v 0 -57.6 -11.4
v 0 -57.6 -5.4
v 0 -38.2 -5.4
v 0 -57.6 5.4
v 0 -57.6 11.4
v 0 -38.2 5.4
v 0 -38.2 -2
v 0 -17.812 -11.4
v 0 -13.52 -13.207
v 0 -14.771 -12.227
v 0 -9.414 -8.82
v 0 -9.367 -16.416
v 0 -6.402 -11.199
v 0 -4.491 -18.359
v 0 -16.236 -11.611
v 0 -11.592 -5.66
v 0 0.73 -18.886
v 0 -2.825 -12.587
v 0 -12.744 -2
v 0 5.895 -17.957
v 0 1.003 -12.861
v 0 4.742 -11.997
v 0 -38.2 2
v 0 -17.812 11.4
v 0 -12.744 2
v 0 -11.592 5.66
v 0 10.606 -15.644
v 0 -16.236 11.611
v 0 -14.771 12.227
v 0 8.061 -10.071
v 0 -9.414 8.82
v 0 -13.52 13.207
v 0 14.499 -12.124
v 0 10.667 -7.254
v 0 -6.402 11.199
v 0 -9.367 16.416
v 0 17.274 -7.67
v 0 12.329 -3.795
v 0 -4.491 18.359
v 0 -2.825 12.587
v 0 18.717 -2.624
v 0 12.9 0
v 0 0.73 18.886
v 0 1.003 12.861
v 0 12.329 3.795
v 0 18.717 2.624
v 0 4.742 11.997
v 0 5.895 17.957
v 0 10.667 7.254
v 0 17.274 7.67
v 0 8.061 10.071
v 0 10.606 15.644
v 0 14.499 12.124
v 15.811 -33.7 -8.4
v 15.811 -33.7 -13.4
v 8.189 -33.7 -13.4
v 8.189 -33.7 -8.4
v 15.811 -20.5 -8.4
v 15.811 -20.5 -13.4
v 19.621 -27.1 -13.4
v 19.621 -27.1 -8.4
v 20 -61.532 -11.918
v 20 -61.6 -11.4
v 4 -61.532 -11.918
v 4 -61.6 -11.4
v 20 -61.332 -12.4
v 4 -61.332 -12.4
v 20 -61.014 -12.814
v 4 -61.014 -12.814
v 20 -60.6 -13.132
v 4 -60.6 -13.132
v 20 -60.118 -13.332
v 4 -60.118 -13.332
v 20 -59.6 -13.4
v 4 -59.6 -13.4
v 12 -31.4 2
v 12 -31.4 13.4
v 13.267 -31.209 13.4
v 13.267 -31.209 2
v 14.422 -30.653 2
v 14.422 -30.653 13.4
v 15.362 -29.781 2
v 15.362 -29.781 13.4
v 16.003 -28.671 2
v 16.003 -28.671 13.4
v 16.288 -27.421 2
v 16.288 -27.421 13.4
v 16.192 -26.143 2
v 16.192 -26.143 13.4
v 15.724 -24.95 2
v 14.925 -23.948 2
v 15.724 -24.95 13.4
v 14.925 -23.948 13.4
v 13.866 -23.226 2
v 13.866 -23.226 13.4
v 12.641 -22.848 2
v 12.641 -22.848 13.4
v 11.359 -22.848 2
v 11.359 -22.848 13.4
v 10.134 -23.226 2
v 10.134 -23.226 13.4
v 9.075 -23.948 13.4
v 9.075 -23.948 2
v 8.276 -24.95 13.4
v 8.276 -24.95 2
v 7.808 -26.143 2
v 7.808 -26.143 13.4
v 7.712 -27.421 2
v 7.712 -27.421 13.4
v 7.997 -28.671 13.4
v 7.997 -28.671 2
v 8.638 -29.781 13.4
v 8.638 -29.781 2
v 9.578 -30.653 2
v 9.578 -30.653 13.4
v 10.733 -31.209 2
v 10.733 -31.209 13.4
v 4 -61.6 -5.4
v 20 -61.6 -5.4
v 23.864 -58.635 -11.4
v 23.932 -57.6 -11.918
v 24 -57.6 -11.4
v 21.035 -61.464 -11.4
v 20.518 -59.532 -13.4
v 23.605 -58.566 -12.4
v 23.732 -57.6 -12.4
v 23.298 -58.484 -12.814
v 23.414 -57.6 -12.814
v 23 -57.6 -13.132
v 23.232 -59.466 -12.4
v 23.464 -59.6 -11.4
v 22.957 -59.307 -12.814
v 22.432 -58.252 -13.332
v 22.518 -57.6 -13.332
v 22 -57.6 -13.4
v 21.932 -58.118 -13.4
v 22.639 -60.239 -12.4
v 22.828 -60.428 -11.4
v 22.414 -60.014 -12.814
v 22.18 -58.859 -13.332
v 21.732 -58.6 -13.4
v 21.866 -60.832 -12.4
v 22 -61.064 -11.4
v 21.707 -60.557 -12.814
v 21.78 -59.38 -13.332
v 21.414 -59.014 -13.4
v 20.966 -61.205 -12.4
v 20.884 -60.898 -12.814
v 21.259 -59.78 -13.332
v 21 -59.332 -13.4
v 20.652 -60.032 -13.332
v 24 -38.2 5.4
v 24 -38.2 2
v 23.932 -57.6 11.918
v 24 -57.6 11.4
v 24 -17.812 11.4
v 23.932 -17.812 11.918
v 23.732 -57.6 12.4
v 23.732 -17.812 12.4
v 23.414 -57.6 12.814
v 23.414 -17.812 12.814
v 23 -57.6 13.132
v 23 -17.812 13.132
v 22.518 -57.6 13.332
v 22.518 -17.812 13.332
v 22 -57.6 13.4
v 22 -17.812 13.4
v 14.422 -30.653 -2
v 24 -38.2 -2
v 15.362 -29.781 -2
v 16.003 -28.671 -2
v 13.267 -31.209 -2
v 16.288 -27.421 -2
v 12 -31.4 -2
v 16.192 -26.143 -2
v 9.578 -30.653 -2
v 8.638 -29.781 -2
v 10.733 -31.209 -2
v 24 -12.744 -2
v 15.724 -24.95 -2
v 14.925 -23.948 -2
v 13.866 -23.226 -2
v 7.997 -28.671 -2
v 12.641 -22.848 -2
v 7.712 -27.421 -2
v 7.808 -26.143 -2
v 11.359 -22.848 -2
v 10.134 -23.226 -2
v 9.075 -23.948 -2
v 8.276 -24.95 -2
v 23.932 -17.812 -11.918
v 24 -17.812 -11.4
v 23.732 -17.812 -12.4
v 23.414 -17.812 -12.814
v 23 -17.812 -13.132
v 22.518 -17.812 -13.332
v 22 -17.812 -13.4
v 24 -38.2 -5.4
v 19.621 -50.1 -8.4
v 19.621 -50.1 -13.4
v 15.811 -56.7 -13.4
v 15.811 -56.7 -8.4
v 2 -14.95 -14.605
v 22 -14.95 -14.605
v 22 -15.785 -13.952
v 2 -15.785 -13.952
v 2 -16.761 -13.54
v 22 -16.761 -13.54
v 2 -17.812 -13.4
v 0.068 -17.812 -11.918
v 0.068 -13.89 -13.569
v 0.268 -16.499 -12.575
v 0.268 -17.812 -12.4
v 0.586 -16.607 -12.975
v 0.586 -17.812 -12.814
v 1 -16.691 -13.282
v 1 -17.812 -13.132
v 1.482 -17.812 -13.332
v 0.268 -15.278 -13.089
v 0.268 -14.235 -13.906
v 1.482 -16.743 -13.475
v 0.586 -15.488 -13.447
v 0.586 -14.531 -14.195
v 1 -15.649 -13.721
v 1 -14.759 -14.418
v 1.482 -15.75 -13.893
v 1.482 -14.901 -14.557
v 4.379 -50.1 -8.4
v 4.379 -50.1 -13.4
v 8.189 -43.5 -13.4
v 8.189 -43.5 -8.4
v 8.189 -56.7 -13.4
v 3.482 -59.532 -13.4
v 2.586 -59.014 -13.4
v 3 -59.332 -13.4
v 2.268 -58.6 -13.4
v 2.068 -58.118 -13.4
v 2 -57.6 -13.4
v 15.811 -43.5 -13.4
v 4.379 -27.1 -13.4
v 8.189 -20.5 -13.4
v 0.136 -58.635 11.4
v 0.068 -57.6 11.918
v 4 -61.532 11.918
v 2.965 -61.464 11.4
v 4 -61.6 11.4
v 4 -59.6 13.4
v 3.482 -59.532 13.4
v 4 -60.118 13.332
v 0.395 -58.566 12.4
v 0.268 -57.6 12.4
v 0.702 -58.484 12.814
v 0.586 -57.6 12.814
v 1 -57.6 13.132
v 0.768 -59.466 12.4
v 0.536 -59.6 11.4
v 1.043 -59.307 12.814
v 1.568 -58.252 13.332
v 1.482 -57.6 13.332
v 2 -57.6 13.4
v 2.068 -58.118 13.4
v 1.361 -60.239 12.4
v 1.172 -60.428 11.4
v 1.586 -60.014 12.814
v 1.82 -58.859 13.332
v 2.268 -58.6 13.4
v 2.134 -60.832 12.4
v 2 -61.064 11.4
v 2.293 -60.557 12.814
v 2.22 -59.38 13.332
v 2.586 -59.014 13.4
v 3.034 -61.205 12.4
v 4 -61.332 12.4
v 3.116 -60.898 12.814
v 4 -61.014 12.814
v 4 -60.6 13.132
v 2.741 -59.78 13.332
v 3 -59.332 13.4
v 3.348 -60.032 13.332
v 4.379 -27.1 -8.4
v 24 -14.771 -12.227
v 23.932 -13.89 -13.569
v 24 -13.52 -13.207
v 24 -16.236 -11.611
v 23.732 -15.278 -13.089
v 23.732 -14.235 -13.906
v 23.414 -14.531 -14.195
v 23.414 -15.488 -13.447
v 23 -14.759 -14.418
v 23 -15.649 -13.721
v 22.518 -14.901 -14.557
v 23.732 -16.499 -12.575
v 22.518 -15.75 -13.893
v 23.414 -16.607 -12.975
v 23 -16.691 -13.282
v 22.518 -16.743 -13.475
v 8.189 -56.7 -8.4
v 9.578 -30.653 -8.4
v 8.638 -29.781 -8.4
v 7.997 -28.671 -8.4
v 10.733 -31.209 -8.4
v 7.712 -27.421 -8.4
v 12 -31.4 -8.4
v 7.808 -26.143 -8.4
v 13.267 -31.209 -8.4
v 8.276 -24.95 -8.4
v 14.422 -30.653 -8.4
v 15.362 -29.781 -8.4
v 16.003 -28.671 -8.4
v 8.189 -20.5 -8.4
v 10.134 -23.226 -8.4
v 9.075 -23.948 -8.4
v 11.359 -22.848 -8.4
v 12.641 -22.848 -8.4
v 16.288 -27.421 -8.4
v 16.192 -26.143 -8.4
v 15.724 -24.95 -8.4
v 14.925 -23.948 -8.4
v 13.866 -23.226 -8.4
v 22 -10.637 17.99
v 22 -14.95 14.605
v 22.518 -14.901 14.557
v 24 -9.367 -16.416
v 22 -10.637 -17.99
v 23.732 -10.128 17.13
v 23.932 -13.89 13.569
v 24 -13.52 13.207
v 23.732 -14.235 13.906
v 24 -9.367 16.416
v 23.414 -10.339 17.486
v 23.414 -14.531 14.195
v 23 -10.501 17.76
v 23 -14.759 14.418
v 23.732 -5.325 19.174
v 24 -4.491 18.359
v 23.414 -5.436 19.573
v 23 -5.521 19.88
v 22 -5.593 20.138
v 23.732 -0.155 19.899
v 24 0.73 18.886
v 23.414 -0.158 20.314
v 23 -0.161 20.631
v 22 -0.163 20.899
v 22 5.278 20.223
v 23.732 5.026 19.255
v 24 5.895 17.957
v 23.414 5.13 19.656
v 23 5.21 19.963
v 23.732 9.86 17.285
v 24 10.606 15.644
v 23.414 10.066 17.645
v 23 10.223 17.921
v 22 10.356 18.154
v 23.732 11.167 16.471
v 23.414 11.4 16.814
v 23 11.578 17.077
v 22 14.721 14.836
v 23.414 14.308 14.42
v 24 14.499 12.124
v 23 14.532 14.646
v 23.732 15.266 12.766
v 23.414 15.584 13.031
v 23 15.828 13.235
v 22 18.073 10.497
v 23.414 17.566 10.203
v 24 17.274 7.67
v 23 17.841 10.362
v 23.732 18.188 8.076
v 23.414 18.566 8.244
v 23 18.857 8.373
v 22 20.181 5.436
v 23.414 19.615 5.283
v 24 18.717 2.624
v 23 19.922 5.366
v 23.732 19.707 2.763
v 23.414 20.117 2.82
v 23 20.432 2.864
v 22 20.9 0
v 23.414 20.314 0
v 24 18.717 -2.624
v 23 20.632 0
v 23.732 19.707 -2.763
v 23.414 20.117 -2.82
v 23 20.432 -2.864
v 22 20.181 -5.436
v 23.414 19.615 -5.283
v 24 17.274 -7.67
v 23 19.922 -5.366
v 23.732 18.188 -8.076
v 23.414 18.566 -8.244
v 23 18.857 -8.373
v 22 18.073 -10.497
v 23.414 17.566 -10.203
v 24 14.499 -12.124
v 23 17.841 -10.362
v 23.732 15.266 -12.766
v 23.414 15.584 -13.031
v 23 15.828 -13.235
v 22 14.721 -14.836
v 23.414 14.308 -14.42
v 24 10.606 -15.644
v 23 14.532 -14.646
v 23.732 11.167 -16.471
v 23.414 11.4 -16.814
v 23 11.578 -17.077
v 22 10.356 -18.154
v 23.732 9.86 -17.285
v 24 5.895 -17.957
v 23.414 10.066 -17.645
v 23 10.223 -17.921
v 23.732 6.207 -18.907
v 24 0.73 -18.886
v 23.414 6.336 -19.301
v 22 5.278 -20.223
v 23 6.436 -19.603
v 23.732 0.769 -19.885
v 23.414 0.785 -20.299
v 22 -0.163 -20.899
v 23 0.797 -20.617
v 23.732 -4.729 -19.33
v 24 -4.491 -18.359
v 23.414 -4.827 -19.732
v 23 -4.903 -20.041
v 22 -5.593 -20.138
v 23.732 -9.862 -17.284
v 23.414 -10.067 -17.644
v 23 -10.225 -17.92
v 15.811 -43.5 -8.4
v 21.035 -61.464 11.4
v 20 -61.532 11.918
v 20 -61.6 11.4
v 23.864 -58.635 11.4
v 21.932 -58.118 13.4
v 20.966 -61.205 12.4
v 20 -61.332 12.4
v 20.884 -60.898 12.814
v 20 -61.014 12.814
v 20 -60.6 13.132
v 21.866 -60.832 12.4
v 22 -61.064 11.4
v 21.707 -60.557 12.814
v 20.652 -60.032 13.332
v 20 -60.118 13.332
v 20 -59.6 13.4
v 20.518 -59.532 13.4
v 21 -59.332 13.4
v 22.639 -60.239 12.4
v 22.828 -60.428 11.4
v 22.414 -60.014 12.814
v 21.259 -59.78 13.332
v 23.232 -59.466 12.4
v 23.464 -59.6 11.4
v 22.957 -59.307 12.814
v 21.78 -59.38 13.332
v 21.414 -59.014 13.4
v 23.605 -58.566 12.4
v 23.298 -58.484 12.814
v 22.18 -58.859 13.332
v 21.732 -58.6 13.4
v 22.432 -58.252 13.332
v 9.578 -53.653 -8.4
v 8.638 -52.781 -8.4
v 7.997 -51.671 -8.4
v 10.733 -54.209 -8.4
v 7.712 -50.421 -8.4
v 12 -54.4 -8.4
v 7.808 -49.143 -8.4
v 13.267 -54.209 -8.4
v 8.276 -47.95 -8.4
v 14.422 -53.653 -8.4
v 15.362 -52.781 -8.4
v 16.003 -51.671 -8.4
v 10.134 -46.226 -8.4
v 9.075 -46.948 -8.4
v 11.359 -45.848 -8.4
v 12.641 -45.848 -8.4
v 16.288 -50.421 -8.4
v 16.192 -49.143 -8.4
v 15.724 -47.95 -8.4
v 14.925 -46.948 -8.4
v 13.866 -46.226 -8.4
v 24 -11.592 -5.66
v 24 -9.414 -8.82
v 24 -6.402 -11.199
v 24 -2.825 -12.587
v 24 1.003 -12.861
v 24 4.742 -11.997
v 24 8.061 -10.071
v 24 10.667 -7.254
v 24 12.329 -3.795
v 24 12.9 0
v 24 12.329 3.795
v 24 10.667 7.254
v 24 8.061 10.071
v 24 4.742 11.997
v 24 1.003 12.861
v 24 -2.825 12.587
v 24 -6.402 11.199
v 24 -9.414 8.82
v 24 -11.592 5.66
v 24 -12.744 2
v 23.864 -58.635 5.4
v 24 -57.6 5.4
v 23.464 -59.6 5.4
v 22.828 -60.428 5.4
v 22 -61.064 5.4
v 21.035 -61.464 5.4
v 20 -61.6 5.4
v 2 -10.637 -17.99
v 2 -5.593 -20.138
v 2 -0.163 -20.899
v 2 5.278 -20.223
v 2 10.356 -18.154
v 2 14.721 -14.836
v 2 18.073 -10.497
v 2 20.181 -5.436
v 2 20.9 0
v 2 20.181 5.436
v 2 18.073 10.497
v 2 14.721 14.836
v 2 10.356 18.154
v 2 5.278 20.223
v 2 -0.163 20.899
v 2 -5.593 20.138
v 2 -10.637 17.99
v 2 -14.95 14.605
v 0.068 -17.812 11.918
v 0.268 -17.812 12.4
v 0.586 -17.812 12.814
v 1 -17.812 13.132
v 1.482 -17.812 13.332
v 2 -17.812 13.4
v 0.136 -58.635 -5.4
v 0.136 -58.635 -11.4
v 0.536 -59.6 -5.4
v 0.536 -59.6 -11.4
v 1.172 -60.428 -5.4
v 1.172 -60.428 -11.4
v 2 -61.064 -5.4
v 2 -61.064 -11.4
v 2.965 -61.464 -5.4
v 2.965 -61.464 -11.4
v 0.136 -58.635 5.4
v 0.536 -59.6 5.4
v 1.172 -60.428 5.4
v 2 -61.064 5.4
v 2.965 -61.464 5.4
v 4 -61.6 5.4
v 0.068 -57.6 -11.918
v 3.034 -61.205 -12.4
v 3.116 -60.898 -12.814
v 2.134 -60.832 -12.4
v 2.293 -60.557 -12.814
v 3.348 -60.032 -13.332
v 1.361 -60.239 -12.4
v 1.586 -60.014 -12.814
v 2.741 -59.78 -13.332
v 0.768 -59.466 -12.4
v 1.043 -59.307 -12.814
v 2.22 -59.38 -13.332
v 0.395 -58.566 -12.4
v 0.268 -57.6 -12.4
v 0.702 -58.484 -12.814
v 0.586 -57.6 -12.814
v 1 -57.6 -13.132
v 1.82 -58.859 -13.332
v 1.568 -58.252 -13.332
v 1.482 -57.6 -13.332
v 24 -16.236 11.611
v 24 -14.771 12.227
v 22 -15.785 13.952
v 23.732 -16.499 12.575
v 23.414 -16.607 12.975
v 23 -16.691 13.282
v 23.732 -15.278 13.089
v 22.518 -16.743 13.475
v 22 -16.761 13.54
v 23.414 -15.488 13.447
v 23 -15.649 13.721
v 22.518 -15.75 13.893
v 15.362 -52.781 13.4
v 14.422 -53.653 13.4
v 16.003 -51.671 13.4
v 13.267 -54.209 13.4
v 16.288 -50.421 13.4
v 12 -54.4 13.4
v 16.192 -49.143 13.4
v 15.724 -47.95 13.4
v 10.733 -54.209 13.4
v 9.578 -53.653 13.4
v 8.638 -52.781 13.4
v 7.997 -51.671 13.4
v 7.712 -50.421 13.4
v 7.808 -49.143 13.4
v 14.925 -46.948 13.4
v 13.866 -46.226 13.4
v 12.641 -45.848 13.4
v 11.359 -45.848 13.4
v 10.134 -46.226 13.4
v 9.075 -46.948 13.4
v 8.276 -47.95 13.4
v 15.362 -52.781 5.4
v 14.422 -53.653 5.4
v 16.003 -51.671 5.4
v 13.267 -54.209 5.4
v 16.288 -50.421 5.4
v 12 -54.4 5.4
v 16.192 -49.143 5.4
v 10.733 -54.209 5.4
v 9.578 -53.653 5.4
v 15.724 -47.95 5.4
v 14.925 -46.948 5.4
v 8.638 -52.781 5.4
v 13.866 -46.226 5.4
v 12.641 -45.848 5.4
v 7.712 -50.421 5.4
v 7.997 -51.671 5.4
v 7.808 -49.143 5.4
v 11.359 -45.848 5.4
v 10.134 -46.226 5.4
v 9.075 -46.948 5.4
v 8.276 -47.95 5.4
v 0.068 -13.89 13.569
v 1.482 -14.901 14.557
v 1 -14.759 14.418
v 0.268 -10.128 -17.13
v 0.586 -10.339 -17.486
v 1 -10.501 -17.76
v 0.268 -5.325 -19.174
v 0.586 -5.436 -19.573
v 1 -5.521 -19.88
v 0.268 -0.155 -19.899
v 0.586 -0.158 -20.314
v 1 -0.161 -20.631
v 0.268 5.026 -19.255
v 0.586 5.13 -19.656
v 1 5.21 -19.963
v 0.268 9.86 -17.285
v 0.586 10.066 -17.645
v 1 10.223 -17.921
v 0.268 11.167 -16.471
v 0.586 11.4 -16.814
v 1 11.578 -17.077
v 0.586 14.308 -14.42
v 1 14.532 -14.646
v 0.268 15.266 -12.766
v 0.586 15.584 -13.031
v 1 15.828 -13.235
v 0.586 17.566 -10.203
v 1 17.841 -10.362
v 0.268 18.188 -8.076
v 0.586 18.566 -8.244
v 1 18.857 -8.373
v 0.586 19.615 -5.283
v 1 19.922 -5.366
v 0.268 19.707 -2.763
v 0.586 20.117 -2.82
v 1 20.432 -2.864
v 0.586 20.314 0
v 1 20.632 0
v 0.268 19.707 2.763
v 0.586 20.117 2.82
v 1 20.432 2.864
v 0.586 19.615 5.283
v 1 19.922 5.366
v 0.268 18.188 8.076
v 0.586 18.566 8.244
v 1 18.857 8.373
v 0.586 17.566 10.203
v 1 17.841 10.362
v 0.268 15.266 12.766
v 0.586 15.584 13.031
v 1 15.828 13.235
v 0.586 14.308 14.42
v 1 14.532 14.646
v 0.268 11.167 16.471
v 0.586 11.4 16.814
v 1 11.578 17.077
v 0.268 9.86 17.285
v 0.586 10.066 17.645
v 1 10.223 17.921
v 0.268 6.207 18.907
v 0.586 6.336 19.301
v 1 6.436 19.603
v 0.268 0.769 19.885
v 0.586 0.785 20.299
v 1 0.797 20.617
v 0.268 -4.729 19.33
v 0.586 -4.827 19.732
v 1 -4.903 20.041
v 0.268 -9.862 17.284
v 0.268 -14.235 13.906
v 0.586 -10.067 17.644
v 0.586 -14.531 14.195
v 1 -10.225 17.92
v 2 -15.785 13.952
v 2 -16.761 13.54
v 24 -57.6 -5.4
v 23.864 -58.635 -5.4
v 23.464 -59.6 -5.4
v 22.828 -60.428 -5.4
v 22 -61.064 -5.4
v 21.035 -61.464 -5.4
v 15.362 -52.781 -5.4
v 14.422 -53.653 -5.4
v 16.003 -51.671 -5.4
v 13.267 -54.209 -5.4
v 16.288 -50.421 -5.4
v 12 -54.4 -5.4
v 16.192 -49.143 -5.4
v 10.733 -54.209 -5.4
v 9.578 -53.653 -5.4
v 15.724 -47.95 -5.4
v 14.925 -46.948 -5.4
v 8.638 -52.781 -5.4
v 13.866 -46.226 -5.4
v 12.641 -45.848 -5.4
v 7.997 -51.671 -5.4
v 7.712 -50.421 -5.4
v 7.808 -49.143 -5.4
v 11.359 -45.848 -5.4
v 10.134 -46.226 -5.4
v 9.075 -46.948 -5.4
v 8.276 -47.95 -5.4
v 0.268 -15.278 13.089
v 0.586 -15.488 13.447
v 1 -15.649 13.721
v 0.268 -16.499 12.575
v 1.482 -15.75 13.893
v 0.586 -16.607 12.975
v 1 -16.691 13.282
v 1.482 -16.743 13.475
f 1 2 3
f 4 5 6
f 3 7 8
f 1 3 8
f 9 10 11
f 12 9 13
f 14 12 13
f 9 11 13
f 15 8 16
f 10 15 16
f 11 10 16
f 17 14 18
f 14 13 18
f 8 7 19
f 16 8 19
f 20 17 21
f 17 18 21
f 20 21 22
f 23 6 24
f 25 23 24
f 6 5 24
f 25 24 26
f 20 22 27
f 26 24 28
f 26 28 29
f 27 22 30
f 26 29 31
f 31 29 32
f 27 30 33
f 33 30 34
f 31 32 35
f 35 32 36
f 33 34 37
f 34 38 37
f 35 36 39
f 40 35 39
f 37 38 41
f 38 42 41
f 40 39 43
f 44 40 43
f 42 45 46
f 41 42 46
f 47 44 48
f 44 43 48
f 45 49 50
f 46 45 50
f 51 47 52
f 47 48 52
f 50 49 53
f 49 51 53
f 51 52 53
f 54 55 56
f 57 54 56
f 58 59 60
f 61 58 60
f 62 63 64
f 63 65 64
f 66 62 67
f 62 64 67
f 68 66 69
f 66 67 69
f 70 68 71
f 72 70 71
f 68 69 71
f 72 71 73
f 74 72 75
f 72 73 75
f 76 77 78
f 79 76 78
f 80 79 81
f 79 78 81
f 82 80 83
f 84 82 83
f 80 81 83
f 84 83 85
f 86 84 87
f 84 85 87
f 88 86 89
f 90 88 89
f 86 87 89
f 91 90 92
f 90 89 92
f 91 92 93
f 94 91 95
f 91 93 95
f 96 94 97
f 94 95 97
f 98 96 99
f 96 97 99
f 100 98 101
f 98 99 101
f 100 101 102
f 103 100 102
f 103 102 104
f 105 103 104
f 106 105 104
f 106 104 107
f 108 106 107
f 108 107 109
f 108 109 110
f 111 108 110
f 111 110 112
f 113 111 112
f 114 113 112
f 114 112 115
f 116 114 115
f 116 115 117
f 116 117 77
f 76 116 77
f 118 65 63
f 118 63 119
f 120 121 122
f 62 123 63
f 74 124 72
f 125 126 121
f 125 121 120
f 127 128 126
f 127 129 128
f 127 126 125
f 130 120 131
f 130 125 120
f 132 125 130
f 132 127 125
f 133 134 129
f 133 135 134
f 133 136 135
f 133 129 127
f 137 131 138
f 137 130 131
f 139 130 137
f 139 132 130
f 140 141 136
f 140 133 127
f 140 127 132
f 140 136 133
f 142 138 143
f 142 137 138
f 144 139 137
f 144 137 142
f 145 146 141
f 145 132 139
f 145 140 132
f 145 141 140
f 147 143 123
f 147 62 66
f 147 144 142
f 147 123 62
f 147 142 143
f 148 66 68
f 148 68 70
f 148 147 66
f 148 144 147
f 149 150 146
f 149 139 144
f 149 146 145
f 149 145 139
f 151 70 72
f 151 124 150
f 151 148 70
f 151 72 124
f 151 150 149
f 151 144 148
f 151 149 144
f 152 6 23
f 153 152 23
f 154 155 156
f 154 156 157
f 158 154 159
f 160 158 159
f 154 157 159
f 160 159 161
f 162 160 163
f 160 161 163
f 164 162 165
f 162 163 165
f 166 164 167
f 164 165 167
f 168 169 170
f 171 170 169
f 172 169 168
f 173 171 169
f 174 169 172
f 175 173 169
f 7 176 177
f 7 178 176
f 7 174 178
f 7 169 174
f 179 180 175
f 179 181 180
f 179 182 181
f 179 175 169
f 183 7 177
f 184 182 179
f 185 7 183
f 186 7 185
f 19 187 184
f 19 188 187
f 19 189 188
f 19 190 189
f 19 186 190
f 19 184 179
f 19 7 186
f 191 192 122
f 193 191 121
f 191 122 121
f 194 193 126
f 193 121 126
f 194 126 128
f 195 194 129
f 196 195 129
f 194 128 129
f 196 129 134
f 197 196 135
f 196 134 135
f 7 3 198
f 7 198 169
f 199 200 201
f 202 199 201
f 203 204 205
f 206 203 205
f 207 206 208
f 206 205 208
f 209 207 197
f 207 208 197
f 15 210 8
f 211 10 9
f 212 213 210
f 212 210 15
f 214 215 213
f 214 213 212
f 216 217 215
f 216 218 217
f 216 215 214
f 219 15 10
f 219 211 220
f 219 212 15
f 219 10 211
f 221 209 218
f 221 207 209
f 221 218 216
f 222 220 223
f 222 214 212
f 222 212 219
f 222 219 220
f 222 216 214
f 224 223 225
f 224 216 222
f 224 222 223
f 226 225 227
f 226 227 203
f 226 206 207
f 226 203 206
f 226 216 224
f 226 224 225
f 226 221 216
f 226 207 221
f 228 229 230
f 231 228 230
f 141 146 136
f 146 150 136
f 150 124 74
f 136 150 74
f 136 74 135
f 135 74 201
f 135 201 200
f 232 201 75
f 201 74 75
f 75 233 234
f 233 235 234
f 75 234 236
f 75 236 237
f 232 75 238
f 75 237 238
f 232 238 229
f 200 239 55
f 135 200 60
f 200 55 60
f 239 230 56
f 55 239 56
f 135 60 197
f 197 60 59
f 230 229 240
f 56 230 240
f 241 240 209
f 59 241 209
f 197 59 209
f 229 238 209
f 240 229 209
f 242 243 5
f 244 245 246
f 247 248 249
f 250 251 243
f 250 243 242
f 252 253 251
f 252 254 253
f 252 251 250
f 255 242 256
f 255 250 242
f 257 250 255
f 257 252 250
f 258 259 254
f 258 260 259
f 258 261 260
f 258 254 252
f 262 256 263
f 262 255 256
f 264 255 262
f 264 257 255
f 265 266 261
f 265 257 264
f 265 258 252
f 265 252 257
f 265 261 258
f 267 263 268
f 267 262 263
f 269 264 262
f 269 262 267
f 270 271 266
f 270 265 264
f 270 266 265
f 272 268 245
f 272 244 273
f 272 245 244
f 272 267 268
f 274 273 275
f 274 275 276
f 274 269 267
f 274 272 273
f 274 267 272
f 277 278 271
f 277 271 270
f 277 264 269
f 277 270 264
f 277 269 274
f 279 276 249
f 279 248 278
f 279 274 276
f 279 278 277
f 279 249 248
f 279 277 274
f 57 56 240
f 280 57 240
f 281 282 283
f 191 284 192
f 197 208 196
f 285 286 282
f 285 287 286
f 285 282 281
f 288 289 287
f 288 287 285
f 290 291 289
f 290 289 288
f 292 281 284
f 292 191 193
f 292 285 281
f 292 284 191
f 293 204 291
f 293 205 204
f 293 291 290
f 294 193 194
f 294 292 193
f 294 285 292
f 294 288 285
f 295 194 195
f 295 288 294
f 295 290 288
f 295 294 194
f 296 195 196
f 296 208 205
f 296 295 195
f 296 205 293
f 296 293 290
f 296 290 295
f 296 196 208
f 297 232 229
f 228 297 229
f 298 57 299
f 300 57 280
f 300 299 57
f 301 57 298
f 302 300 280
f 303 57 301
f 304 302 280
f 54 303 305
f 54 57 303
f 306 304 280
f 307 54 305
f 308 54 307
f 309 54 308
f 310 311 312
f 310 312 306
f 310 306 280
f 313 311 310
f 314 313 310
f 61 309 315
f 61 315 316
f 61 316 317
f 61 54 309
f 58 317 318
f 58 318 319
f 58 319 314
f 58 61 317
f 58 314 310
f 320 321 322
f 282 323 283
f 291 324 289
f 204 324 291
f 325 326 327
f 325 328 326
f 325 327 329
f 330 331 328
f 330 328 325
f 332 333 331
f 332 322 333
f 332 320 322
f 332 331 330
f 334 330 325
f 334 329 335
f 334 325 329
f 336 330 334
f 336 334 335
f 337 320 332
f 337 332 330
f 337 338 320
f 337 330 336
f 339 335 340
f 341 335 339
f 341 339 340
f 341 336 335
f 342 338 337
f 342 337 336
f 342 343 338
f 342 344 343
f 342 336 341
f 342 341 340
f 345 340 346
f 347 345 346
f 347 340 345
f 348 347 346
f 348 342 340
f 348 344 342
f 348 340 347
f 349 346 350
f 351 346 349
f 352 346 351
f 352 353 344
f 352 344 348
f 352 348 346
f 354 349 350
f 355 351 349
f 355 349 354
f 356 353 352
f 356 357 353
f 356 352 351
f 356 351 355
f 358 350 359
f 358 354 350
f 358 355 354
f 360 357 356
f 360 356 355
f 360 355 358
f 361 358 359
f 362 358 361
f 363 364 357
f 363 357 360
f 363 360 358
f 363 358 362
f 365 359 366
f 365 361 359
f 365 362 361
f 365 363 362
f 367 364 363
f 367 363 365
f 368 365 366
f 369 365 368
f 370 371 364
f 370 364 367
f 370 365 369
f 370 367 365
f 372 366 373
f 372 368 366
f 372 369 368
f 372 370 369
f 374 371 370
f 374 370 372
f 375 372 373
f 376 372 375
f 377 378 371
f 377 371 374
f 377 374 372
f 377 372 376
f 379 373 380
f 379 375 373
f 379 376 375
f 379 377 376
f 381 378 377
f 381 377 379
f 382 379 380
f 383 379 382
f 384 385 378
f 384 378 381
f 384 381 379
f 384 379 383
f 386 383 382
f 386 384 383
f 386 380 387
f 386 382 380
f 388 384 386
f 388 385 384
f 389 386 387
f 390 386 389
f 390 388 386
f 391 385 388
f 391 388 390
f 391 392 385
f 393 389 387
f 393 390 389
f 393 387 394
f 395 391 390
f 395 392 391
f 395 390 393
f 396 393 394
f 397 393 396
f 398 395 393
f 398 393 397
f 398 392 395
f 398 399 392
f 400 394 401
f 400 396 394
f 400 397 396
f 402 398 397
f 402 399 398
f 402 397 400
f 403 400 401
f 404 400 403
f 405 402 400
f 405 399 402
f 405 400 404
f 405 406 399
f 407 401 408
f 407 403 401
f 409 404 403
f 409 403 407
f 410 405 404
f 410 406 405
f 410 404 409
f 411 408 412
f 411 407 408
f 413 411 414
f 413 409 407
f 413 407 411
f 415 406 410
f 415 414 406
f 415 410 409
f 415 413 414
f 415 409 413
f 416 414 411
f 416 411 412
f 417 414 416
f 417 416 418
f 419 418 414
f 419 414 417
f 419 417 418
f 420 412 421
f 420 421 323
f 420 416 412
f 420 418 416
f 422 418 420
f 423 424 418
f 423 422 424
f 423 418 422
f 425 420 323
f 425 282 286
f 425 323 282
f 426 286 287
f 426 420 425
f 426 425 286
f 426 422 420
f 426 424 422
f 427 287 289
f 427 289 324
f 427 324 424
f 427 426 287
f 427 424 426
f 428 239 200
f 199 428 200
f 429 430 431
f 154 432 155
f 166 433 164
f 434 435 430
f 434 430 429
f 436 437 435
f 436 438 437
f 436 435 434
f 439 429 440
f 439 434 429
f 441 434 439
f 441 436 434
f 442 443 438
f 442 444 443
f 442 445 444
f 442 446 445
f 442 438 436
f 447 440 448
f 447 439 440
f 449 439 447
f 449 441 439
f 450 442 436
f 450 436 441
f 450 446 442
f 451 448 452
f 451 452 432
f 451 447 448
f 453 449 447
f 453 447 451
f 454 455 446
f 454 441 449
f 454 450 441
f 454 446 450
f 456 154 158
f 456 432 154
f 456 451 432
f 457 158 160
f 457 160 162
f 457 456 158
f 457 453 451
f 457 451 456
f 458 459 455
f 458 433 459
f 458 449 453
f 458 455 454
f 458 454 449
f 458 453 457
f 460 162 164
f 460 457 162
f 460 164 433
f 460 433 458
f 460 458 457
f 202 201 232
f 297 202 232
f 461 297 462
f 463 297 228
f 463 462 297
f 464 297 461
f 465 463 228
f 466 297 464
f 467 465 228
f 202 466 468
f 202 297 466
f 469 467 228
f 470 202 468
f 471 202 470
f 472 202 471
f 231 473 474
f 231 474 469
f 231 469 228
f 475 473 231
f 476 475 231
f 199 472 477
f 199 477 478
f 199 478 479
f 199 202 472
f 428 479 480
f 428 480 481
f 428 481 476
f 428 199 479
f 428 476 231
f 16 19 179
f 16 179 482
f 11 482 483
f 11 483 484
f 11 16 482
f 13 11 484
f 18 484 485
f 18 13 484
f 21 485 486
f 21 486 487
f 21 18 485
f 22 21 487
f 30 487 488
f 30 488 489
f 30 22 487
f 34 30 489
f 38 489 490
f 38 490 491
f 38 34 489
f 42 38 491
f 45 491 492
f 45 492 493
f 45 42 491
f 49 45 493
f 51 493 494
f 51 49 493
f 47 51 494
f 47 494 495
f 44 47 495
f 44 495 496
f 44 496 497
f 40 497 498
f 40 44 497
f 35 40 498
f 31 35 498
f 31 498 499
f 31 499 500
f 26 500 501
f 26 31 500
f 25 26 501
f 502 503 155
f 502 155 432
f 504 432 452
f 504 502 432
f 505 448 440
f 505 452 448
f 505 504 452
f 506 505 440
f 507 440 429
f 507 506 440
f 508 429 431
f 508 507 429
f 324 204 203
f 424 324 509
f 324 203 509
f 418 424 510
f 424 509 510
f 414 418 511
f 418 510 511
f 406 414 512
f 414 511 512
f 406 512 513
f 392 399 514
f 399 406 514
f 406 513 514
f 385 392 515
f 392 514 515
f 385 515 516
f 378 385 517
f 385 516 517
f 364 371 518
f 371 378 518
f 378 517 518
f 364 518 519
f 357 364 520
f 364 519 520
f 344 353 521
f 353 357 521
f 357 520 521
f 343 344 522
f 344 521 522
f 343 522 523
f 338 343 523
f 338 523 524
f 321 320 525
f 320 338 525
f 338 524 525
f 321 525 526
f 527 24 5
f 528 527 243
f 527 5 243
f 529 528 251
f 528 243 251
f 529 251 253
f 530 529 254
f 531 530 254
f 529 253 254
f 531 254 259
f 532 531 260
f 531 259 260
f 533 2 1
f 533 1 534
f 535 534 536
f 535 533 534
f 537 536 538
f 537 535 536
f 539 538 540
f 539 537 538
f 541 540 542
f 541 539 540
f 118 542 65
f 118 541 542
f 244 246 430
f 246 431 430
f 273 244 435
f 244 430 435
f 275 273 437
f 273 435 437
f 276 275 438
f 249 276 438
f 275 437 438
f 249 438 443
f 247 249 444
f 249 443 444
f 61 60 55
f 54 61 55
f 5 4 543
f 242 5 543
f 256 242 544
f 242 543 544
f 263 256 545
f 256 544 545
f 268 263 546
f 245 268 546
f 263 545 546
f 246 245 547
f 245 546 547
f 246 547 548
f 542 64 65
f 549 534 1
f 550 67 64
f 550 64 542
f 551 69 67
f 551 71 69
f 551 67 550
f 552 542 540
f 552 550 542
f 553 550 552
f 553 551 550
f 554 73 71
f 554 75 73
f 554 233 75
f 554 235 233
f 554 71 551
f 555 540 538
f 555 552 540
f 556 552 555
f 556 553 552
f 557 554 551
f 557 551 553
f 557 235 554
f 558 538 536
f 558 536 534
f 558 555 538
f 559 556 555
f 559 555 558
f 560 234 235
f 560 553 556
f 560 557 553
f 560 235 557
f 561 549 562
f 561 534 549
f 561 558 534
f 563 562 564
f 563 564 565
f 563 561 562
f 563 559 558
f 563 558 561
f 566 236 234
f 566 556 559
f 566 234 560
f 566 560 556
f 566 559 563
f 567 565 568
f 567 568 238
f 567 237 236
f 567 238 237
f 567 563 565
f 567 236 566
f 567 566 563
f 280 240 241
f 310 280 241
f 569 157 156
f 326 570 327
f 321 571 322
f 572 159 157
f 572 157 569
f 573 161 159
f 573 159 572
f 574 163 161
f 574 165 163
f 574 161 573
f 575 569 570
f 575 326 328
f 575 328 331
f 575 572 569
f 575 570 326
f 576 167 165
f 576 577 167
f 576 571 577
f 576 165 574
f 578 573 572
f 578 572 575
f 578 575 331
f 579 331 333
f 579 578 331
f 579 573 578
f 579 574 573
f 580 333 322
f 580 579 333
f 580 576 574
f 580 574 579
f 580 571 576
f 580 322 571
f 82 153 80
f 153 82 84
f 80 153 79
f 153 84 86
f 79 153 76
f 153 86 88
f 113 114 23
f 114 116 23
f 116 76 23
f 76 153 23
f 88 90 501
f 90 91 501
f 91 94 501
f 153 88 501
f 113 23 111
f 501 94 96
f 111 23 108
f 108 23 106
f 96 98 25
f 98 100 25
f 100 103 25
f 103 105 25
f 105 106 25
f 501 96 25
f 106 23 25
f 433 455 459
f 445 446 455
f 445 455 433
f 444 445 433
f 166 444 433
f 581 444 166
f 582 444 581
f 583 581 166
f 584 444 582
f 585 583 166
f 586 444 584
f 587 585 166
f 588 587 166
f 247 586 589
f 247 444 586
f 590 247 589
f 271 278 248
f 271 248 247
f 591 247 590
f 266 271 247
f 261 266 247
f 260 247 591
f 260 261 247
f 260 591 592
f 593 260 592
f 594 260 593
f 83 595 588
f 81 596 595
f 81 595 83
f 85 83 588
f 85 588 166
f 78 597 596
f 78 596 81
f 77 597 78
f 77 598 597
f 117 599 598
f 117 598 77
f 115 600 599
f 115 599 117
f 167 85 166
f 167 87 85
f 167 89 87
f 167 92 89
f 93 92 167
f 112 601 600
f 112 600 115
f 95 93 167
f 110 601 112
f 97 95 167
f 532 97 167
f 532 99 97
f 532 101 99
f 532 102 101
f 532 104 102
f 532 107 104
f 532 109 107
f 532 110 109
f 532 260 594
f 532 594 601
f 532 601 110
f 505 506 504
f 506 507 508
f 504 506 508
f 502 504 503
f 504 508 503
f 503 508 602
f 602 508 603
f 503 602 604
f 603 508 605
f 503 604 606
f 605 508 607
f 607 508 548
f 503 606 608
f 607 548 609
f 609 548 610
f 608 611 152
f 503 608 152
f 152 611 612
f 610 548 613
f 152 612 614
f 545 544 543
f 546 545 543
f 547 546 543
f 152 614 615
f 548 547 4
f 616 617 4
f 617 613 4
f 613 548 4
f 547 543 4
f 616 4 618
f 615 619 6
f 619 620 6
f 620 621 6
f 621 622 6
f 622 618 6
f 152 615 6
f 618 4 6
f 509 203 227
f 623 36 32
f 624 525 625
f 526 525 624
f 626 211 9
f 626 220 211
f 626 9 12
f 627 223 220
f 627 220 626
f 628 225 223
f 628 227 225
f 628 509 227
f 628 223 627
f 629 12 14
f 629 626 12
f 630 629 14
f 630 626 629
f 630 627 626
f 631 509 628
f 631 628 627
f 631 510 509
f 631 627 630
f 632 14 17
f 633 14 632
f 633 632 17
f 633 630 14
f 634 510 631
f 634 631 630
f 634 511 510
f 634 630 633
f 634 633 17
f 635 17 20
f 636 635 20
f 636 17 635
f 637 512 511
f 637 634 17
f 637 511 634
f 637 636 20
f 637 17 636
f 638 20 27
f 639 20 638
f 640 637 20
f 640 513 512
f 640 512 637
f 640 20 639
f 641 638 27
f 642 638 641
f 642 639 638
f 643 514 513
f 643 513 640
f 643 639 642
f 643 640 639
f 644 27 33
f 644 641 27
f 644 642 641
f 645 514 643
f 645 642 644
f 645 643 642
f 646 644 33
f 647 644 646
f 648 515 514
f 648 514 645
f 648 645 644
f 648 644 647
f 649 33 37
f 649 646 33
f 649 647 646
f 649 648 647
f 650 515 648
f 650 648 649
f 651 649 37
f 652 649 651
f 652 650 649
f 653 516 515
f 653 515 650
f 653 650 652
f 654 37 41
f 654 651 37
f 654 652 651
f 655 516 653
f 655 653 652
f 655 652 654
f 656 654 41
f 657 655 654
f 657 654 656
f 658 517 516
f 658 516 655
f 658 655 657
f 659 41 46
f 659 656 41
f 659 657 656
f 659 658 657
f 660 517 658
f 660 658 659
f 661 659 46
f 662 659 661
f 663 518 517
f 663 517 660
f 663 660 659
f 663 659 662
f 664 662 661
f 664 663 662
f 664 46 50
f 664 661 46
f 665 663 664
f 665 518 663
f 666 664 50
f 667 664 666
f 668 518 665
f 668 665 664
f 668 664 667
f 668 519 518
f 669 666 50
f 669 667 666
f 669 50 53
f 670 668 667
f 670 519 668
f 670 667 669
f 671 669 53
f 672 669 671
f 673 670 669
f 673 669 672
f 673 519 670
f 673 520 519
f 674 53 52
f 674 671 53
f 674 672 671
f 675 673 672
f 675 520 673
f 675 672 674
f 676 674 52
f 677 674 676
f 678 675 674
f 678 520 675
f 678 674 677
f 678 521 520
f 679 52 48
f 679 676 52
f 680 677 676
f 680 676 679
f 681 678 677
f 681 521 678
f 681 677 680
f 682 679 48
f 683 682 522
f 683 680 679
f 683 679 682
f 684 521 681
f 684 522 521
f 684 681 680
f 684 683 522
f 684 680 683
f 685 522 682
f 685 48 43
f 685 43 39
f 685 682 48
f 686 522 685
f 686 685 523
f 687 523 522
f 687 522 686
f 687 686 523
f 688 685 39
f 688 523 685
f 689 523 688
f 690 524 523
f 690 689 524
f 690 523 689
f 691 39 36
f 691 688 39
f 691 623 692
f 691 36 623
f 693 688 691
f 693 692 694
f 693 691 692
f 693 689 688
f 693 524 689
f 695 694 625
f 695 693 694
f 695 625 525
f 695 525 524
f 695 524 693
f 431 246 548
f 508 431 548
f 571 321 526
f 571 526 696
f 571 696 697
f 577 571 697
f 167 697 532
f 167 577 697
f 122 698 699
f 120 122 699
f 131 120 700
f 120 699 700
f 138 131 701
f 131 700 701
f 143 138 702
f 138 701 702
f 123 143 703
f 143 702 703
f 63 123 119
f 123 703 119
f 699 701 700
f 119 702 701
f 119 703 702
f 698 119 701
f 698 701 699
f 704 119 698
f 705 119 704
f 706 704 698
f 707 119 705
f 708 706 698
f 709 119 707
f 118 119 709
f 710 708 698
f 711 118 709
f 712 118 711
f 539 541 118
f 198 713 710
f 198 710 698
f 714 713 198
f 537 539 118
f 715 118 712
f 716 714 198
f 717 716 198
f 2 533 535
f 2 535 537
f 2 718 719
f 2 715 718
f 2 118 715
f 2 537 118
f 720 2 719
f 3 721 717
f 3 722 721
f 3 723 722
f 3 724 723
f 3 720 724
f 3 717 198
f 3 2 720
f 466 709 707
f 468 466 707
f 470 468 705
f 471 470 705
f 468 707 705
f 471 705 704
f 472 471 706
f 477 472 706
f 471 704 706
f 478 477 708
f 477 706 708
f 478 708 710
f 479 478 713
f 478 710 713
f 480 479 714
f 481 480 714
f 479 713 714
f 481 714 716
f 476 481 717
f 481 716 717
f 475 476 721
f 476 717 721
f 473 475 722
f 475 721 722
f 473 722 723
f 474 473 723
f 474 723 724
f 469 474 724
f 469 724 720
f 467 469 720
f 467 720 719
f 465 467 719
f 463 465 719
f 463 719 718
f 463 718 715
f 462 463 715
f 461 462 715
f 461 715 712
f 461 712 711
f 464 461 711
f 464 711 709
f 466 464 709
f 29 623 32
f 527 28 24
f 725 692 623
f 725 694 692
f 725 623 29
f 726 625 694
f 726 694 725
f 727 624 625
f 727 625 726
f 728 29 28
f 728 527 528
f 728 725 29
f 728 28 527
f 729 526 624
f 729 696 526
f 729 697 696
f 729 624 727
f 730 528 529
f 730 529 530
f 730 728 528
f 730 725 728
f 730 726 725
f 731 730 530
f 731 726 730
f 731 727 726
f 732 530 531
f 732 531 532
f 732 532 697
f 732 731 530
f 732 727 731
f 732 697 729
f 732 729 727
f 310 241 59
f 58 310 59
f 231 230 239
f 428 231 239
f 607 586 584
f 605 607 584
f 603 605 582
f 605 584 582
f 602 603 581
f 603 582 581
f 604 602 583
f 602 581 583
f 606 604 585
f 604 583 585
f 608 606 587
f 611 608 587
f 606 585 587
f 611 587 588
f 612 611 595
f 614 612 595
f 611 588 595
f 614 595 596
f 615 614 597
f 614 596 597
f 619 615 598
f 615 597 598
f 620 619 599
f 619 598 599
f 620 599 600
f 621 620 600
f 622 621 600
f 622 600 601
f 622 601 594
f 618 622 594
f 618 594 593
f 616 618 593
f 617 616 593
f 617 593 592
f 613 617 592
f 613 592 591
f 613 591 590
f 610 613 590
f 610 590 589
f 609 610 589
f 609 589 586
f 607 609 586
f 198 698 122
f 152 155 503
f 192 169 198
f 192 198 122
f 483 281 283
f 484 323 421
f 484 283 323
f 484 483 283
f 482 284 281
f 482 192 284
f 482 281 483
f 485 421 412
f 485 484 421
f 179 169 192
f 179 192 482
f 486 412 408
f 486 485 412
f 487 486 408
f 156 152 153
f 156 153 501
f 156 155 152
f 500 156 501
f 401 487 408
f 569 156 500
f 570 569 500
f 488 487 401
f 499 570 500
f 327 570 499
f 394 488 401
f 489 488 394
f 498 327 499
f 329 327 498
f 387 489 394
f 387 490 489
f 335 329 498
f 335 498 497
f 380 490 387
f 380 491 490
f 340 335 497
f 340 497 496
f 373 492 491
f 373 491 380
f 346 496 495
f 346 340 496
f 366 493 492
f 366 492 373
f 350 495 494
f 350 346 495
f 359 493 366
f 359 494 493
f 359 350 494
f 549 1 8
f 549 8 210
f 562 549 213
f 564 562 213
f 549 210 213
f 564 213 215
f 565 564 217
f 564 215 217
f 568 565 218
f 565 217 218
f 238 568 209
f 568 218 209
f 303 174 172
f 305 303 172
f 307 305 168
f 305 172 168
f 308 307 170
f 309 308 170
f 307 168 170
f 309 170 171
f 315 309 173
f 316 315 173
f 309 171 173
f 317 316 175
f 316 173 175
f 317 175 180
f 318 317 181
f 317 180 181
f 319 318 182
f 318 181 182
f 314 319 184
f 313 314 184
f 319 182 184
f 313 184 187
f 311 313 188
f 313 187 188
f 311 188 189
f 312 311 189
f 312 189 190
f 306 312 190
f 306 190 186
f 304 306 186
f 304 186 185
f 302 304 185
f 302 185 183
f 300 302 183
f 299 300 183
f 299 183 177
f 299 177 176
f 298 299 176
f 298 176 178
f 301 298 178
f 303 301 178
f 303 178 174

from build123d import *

# Parameters (mm, degrees)
PAD_DEPTH       = 24
SKETCH001_R     = 4.3
POCKET_DEPTH    = 34.301
POCKET001_DEPTH = 5
FILLET_R        = 4
FILLET001_R     = 2


with BuildPart() as part:
    # Sketch → Pad (new body)
    with BuildSketch(Plane.YZ):
        with BuildLine():
            ThreePointArc((-16.039015, -13.4), (20.9, 0), (-16.039015, 13.4))
            Line((-61.6, 13.4), (-16.039015, 13.4))
            Line((-61.6, 13.4), (-61.6, 5.4))
            Line((-61.6, 5.4), (-38.2, 5.4))
            Line((-38.2, 5.4), (-38.2, 2))
            Line((-38.2, 2), (-12.744018, 2))
            ThreePointArc((-12.744018, -2), (12.9, 0), (-12.744018, 2))
            Line((-38.2, -2), (-12.744018, -2))
            Line((-38.2, -5.4), (-38.2, -2))
            Line((-61.6, -5.4), (-38.2, -5.4))
            Line((-61.6, -13.4), (-61.6, -5.4))
            Line((-61.6, -13.4), (-16.039015, -13.4))
        make_face()
    extrude(amount=PAD_DEPTH)

    # Sketch001 (on Face5 of Pad) → Pocket (cut, through all)
    with BuildSketch(Plane(origin=(0, 0, 13.4), x_dir=(0, -1, 0), z_dir=(0, 0, 1))):
        with Locations((50.1, 12)):
            Circle(SKETCH001_R)
        with Locations((27.1, 12)):
            Circle(SKETCH001_R)
    extrude(amount=-POCKET_DEPTH, mode=Mode.SUBTRACT)

    # Sketch002 (on Face7 of Pocket) → Pocket001 (cut)
    with BuildSketch(Plane.YX.offset(13.4)):
        Polygon((-43.5, 8.189488), (-43.5, 15.810512), (-50.1, 19.621024), (-56.7, 15.810512), (-56.7, 8.189488), (-50.1, 4.378976), align=None)
        Polygon((-20.5, 8.189488), (-20.5, 15.810512), (-27.1, 19.621024), (-33.7, 15.810512), (-33.7, 8.189488), (-27.1, 4.378976), align=None)
    extrude(amount=-POCKET001_DEPTH, mode=Mode.SUBTRACT)

    # Fillet
    fillet_edges = [part.edges().sort_by_distance(p)[0] for p in [
        (12, -16.039015, -13.4),
        (12, -16.039015, 13.4),
        (0, -61.6, 9.4),
        (24, -61.6, 9.4),
        (0, -61.6, -9.4),
        (24, -61.6, -9.4),
    ]]
    fillet(fillet_edges, radius=FILLET_R)

    # Fillet001
    fillet001_edges = [part.edges().sort_by_distance(p)[0] for p in [
        (0, -37.705757, -13.4),
    ]]
    fillet(fillet001_edges, radius=FILLET001_R)


solid = part.part
